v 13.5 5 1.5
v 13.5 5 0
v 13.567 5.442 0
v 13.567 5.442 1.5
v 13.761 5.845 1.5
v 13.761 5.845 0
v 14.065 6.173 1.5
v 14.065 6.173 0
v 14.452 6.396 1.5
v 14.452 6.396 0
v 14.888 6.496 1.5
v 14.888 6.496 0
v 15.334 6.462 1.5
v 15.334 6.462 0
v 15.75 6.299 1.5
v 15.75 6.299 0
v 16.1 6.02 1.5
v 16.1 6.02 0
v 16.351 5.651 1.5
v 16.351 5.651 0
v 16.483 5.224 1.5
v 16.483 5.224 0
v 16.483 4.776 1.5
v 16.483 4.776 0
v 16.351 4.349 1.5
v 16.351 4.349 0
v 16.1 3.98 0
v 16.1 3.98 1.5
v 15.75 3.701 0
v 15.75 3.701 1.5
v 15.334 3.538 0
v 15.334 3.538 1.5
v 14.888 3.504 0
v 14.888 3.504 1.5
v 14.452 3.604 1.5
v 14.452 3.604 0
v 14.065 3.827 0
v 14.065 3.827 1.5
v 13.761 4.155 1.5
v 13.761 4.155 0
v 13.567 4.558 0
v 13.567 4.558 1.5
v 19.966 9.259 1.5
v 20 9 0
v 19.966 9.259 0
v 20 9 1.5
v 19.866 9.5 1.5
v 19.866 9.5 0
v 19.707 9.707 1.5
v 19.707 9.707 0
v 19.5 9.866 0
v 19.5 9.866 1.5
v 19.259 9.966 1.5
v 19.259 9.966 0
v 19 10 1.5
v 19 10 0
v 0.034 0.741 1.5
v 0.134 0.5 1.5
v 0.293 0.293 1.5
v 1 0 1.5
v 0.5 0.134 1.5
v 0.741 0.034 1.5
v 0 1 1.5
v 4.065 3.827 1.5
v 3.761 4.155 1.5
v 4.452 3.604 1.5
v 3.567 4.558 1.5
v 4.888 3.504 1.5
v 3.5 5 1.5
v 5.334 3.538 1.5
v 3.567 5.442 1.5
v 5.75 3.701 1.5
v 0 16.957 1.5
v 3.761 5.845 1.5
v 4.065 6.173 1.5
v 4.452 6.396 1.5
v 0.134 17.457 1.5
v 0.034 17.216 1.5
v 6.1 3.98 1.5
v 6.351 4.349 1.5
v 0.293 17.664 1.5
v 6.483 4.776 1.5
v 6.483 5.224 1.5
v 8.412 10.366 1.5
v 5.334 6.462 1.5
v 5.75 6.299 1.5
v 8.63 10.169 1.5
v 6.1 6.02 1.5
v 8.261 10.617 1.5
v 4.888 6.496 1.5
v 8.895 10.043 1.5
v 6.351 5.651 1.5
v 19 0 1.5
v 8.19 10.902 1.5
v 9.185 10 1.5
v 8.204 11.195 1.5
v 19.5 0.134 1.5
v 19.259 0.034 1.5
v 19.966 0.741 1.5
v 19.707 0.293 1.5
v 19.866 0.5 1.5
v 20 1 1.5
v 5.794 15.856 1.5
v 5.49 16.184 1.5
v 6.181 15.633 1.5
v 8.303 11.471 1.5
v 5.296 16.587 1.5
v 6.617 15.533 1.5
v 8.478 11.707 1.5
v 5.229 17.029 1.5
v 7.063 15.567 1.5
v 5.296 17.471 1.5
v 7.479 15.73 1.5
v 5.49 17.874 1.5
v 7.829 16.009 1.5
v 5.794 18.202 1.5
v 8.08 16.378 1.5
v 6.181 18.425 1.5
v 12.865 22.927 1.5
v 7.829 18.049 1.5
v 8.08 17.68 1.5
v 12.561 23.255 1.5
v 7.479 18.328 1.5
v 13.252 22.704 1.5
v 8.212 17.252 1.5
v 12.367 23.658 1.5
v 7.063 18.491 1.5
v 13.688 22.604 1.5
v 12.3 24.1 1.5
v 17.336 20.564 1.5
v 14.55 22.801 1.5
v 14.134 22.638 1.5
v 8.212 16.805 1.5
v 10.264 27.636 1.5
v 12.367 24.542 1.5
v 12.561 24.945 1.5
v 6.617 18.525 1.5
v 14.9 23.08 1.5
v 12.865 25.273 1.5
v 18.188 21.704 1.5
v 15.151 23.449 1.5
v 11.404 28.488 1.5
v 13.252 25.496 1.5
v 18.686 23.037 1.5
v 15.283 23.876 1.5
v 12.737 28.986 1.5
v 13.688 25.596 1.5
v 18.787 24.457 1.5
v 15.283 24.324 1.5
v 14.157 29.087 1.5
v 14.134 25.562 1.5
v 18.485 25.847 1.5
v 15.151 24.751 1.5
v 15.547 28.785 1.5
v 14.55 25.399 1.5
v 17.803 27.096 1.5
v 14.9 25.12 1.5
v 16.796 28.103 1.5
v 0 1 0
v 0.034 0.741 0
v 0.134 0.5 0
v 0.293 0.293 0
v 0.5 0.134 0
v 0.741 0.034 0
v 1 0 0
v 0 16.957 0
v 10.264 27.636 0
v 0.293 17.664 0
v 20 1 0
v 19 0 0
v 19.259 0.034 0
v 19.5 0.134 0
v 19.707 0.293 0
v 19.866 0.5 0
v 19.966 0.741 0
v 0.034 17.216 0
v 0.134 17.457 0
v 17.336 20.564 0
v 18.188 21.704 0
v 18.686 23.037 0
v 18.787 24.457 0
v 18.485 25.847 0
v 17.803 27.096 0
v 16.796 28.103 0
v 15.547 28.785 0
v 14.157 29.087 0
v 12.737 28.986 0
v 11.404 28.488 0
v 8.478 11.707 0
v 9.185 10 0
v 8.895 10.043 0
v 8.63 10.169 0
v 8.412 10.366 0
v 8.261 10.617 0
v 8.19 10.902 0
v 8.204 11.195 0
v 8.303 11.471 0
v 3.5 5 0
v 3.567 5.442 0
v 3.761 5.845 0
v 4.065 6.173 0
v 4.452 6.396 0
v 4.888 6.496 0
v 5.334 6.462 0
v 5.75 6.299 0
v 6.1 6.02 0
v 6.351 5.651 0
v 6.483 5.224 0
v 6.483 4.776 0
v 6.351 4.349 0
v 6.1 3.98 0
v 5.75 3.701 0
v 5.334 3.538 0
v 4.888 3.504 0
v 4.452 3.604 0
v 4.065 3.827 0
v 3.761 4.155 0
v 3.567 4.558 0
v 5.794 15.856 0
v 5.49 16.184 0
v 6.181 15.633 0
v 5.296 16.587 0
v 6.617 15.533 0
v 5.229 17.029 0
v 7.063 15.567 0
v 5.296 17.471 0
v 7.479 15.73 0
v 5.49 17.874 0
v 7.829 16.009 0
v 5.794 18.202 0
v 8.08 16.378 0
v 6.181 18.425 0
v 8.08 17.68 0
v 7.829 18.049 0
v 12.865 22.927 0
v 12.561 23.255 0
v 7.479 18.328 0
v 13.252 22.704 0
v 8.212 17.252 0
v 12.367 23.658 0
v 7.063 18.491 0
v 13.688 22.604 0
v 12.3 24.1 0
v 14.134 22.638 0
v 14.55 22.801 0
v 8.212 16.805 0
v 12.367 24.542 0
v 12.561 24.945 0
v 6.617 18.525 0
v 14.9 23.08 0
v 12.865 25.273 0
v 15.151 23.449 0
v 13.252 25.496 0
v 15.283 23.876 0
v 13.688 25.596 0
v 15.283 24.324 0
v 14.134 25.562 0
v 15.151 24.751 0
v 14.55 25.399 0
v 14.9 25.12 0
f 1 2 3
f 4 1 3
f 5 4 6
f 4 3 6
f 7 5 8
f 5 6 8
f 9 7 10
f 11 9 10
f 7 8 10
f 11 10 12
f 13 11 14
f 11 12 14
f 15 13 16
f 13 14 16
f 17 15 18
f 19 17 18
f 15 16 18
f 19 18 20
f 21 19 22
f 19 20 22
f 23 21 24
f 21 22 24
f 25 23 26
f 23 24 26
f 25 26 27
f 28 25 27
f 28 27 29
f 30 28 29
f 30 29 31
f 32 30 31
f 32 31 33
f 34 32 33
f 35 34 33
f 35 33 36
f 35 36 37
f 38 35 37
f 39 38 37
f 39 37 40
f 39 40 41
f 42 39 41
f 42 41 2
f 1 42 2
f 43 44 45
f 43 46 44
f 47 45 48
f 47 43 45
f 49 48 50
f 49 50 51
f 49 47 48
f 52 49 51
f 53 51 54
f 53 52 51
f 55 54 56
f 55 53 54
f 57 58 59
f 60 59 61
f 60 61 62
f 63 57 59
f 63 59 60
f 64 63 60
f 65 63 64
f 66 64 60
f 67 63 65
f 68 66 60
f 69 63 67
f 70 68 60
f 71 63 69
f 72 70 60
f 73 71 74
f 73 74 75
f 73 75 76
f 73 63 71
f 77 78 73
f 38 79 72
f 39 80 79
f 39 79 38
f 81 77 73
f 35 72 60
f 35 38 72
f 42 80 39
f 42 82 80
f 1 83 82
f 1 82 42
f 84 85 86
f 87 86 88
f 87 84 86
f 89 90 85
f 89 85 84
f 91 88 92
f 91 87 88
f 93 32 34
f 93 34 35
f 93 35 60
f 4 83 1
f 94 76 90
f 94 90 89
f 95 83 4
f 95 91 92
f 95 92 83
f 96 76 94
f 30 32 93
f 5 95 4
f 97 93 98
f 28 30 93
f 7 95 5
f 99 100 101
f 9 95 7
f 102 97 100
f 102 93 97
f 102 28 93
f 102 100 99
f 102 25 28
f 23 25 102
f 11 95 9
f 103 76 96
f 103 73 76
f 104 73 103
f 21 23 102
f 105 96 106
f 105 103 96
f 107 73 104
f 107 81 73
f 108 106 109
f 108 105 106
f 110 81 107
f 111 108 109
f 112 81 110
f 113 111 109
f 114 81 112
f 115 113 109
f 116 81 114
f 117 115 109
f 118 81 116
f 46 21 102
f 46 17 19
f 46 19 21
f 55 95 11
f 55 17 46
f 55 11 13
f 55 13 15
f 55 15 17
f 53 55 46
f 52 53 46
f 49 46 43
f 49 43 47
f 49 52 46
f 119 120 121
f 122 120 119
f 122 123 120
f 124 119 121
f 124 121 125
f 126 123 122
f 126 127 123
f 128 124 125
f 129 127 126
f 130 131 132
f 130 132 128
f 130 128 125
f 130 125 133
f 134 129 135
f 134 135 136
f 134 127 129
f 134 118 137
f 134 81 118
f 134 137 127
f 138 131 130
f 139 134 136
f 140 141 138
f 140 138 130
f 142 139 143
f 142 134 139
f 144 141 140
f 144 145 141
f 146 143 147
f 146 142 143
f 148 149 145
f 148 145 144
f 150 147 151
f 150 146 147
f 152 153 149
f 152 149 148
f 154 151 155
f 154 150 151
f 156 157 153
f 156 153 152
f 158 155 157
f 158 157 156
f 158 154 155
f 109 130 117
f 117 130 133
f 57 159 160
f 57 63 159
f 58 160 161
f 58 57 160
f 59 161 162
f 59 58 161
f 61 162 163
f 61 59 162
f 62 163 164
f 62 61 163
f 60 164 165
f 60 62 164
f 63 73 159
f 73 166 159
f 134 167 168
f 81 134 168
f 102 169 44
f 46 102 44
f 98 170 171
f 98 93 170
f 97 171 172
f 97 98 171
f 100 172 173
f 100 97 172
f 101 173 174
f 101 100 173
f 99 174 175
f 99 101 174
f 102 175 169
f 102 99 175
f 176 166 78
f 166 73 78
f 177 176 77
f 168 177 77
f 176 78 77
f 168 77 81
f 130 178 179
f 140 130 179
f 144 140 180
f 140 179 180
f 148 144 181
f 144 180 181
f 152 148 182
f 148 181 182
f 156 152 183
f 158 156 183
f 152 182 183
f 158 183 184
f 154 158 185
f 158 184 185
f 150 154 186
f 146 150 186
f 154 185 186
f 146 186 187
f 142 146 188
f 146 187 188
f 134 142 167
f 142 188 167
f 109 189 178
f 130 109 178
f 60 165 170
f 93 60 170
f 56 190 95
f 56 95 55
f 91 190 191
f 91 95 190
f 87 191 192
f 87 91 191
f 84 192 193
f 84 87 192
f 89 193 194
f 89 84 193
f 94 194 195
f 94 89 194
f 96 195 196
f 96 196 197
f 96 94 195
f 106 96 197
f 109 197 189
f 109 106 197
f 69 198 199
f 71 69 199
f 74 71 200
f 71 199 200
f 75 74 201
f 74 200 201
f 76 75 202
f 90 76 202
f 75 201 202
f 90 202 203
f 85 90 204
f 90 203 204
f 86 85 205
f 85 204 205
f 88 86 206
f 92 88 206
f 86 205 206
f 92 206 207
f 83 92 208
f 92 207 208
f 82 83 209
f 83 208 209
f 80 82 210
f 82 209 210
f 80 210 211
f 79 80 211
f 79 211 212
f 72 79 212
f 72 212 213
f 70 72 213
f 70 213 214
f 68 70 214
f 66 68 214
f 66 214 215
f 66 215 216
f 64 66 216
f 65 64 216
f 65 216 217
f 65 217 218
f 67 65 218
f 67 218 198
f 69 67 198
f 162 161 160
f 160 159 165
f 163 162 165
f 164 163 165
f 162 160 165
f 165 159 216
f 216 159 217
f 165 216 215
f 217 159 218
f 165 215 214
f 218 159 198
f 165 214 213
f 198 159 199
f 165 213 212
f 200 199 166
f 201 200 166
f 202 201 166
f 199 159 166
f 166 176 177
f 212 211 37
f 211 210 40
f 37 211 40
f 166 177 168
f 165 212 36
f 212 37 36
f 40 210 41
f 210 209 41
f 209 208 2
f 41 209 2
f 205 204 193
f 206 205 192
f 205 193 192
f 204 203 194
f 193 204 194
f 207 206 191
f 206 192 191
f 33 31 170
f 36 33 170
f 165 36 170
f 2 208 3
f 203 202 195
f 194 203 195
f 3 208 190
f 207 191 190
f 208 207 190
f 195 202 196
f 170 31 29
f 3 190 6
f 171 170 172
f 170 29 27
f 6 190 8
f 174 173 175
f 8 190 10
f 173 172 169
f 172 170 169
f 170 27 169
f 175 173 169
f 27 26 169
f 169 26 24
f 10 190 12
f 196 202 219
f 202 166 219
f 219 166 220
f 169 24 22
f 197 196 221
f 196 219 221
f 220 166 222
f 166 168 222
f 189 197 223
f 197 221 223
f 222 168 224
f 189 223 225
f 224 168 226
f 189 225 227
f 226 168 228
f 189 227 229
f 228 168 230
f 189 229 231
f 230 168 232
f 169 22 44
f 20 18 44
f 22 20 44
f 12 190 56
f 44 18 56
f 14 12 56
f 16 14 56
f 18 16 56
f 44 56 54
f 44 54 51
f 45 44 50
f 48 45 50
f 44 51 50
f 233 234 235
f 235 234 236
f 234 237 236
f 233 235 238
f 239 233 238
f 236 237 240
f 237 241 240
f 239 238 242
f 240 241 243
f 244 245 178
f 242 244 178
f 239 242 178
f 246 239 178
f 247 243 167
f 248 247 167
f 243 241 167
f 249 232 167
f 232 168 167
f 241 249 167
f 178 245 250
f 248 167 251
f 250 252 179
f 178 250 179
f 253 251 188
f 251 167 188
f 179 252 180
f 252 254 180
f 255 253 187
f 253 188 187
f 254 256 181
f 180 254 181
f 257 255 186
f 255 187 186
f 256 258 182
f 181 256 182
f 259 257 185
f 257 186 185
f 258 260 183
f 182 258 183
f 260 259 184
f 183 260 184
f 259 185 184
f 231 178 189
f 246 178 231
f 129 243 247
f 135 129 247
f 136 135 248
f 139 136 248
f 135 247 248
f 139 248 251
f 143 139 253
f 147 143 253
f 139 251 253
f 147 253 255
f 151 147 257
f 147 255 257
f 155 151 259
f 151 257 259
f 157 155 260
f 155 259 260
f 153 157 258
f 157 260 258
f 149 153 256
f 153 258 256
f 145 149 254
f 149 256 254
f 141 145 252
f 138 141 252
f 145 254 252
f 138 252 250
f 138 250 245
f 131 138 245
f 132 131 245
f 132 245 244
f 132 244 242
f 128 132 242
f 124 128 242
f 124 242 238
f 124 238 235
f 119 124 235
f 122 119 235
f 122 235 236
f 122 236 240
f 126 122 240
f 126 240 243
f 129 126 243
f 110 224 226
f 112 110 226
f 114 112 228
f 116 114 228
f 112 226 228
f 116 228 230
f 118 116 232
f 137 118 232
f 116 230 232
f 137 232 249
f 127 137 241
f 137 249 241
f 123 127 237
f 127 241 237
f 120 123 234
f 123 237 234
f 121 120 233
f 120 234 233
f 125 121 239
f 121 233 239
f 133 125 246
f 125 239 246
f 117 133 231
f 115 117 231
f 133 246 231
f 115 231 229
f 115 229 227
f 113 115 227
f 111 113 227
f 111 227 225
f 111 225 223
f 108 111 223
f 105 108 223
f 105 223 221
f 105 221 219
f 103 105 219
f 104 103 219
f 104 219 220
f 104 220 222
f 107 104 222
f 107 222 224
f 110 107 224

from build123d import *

# Parameters (mm, degrees)
SCHIZZO1_W                   = 20
SCHIZZO1_H                   = 10
ESTRUSIONE_ESTRUSIONE1_DEPTH = 1.5
FORO_3_0_3_1_D               = 3
ESTRUSIONE_ESTRUSIONE3_DEPTH = 1.5
FORO_3_0_3_4_D               = 3
RACCORDO2_R                  = 1


with BuildPart() as part:
    # Schizzo1 → Estrusione-Estrusione1 (new body)
    with BuildSketch(Plane.XY):
        with Locations((10, 5)):
            Rectangle(SCHIZZO1_W, SCHIZZO1_H)
    extrude(amount=ESTRUSIONE_ESTRUSIONE1_DEPTH)

    # Foro Ø3.0 (3)-1 (through all)
    with Locations(Plane.XY.offset(1.5)):
        with Locations((5, 5), (15, 5)):
            Hole(FORO_3_0_3_1_D / 2)

    # Schizzo9 → Estrusione-Estrusione3 (add)
    with BuildSketch(Plane.XY):
        with BuildLine():
            Line((0, 17.371067812), (0, 10))
            Line((0, 10), (6.771067812, 10))
            Line((6.771067812, 10), (17.335533906, 20.564466094))
            ThreePointArc((17.335533906, 20.564466094), (17.335533906, 27.635533906), (10.264466094, 27.635533906))
            Line((10.264466094, 27.635533906), (0, 17.371067812))
        make_face()
    extrude(amount=ESTRUSIONE_ESTRUSIONE3_DEPTH)

    # Foro Ø3.0 (3)-4 (through all)
    with Locations(Plane.XY.offset(1.5)):
        with Locations((13.8, 24.1), (6.728932188, 17.028932188)):
            Hole(FORO_3_0_3_4_D / 2)

    # Raccordo2
    raccordo2_edges = [part.edges().sort_by_distance(p)[0] for p in [
        (0, 0, 0.75),
        (20, 0, 0.75),
        (20, 10, 0.75),
        (6.771067812, 10, 0.75),
        (0, 17.371067812, 0.75),
    ]]
    fillet(raccordo2_edges, radius=RACCORDO2_R)


solid = part.part
